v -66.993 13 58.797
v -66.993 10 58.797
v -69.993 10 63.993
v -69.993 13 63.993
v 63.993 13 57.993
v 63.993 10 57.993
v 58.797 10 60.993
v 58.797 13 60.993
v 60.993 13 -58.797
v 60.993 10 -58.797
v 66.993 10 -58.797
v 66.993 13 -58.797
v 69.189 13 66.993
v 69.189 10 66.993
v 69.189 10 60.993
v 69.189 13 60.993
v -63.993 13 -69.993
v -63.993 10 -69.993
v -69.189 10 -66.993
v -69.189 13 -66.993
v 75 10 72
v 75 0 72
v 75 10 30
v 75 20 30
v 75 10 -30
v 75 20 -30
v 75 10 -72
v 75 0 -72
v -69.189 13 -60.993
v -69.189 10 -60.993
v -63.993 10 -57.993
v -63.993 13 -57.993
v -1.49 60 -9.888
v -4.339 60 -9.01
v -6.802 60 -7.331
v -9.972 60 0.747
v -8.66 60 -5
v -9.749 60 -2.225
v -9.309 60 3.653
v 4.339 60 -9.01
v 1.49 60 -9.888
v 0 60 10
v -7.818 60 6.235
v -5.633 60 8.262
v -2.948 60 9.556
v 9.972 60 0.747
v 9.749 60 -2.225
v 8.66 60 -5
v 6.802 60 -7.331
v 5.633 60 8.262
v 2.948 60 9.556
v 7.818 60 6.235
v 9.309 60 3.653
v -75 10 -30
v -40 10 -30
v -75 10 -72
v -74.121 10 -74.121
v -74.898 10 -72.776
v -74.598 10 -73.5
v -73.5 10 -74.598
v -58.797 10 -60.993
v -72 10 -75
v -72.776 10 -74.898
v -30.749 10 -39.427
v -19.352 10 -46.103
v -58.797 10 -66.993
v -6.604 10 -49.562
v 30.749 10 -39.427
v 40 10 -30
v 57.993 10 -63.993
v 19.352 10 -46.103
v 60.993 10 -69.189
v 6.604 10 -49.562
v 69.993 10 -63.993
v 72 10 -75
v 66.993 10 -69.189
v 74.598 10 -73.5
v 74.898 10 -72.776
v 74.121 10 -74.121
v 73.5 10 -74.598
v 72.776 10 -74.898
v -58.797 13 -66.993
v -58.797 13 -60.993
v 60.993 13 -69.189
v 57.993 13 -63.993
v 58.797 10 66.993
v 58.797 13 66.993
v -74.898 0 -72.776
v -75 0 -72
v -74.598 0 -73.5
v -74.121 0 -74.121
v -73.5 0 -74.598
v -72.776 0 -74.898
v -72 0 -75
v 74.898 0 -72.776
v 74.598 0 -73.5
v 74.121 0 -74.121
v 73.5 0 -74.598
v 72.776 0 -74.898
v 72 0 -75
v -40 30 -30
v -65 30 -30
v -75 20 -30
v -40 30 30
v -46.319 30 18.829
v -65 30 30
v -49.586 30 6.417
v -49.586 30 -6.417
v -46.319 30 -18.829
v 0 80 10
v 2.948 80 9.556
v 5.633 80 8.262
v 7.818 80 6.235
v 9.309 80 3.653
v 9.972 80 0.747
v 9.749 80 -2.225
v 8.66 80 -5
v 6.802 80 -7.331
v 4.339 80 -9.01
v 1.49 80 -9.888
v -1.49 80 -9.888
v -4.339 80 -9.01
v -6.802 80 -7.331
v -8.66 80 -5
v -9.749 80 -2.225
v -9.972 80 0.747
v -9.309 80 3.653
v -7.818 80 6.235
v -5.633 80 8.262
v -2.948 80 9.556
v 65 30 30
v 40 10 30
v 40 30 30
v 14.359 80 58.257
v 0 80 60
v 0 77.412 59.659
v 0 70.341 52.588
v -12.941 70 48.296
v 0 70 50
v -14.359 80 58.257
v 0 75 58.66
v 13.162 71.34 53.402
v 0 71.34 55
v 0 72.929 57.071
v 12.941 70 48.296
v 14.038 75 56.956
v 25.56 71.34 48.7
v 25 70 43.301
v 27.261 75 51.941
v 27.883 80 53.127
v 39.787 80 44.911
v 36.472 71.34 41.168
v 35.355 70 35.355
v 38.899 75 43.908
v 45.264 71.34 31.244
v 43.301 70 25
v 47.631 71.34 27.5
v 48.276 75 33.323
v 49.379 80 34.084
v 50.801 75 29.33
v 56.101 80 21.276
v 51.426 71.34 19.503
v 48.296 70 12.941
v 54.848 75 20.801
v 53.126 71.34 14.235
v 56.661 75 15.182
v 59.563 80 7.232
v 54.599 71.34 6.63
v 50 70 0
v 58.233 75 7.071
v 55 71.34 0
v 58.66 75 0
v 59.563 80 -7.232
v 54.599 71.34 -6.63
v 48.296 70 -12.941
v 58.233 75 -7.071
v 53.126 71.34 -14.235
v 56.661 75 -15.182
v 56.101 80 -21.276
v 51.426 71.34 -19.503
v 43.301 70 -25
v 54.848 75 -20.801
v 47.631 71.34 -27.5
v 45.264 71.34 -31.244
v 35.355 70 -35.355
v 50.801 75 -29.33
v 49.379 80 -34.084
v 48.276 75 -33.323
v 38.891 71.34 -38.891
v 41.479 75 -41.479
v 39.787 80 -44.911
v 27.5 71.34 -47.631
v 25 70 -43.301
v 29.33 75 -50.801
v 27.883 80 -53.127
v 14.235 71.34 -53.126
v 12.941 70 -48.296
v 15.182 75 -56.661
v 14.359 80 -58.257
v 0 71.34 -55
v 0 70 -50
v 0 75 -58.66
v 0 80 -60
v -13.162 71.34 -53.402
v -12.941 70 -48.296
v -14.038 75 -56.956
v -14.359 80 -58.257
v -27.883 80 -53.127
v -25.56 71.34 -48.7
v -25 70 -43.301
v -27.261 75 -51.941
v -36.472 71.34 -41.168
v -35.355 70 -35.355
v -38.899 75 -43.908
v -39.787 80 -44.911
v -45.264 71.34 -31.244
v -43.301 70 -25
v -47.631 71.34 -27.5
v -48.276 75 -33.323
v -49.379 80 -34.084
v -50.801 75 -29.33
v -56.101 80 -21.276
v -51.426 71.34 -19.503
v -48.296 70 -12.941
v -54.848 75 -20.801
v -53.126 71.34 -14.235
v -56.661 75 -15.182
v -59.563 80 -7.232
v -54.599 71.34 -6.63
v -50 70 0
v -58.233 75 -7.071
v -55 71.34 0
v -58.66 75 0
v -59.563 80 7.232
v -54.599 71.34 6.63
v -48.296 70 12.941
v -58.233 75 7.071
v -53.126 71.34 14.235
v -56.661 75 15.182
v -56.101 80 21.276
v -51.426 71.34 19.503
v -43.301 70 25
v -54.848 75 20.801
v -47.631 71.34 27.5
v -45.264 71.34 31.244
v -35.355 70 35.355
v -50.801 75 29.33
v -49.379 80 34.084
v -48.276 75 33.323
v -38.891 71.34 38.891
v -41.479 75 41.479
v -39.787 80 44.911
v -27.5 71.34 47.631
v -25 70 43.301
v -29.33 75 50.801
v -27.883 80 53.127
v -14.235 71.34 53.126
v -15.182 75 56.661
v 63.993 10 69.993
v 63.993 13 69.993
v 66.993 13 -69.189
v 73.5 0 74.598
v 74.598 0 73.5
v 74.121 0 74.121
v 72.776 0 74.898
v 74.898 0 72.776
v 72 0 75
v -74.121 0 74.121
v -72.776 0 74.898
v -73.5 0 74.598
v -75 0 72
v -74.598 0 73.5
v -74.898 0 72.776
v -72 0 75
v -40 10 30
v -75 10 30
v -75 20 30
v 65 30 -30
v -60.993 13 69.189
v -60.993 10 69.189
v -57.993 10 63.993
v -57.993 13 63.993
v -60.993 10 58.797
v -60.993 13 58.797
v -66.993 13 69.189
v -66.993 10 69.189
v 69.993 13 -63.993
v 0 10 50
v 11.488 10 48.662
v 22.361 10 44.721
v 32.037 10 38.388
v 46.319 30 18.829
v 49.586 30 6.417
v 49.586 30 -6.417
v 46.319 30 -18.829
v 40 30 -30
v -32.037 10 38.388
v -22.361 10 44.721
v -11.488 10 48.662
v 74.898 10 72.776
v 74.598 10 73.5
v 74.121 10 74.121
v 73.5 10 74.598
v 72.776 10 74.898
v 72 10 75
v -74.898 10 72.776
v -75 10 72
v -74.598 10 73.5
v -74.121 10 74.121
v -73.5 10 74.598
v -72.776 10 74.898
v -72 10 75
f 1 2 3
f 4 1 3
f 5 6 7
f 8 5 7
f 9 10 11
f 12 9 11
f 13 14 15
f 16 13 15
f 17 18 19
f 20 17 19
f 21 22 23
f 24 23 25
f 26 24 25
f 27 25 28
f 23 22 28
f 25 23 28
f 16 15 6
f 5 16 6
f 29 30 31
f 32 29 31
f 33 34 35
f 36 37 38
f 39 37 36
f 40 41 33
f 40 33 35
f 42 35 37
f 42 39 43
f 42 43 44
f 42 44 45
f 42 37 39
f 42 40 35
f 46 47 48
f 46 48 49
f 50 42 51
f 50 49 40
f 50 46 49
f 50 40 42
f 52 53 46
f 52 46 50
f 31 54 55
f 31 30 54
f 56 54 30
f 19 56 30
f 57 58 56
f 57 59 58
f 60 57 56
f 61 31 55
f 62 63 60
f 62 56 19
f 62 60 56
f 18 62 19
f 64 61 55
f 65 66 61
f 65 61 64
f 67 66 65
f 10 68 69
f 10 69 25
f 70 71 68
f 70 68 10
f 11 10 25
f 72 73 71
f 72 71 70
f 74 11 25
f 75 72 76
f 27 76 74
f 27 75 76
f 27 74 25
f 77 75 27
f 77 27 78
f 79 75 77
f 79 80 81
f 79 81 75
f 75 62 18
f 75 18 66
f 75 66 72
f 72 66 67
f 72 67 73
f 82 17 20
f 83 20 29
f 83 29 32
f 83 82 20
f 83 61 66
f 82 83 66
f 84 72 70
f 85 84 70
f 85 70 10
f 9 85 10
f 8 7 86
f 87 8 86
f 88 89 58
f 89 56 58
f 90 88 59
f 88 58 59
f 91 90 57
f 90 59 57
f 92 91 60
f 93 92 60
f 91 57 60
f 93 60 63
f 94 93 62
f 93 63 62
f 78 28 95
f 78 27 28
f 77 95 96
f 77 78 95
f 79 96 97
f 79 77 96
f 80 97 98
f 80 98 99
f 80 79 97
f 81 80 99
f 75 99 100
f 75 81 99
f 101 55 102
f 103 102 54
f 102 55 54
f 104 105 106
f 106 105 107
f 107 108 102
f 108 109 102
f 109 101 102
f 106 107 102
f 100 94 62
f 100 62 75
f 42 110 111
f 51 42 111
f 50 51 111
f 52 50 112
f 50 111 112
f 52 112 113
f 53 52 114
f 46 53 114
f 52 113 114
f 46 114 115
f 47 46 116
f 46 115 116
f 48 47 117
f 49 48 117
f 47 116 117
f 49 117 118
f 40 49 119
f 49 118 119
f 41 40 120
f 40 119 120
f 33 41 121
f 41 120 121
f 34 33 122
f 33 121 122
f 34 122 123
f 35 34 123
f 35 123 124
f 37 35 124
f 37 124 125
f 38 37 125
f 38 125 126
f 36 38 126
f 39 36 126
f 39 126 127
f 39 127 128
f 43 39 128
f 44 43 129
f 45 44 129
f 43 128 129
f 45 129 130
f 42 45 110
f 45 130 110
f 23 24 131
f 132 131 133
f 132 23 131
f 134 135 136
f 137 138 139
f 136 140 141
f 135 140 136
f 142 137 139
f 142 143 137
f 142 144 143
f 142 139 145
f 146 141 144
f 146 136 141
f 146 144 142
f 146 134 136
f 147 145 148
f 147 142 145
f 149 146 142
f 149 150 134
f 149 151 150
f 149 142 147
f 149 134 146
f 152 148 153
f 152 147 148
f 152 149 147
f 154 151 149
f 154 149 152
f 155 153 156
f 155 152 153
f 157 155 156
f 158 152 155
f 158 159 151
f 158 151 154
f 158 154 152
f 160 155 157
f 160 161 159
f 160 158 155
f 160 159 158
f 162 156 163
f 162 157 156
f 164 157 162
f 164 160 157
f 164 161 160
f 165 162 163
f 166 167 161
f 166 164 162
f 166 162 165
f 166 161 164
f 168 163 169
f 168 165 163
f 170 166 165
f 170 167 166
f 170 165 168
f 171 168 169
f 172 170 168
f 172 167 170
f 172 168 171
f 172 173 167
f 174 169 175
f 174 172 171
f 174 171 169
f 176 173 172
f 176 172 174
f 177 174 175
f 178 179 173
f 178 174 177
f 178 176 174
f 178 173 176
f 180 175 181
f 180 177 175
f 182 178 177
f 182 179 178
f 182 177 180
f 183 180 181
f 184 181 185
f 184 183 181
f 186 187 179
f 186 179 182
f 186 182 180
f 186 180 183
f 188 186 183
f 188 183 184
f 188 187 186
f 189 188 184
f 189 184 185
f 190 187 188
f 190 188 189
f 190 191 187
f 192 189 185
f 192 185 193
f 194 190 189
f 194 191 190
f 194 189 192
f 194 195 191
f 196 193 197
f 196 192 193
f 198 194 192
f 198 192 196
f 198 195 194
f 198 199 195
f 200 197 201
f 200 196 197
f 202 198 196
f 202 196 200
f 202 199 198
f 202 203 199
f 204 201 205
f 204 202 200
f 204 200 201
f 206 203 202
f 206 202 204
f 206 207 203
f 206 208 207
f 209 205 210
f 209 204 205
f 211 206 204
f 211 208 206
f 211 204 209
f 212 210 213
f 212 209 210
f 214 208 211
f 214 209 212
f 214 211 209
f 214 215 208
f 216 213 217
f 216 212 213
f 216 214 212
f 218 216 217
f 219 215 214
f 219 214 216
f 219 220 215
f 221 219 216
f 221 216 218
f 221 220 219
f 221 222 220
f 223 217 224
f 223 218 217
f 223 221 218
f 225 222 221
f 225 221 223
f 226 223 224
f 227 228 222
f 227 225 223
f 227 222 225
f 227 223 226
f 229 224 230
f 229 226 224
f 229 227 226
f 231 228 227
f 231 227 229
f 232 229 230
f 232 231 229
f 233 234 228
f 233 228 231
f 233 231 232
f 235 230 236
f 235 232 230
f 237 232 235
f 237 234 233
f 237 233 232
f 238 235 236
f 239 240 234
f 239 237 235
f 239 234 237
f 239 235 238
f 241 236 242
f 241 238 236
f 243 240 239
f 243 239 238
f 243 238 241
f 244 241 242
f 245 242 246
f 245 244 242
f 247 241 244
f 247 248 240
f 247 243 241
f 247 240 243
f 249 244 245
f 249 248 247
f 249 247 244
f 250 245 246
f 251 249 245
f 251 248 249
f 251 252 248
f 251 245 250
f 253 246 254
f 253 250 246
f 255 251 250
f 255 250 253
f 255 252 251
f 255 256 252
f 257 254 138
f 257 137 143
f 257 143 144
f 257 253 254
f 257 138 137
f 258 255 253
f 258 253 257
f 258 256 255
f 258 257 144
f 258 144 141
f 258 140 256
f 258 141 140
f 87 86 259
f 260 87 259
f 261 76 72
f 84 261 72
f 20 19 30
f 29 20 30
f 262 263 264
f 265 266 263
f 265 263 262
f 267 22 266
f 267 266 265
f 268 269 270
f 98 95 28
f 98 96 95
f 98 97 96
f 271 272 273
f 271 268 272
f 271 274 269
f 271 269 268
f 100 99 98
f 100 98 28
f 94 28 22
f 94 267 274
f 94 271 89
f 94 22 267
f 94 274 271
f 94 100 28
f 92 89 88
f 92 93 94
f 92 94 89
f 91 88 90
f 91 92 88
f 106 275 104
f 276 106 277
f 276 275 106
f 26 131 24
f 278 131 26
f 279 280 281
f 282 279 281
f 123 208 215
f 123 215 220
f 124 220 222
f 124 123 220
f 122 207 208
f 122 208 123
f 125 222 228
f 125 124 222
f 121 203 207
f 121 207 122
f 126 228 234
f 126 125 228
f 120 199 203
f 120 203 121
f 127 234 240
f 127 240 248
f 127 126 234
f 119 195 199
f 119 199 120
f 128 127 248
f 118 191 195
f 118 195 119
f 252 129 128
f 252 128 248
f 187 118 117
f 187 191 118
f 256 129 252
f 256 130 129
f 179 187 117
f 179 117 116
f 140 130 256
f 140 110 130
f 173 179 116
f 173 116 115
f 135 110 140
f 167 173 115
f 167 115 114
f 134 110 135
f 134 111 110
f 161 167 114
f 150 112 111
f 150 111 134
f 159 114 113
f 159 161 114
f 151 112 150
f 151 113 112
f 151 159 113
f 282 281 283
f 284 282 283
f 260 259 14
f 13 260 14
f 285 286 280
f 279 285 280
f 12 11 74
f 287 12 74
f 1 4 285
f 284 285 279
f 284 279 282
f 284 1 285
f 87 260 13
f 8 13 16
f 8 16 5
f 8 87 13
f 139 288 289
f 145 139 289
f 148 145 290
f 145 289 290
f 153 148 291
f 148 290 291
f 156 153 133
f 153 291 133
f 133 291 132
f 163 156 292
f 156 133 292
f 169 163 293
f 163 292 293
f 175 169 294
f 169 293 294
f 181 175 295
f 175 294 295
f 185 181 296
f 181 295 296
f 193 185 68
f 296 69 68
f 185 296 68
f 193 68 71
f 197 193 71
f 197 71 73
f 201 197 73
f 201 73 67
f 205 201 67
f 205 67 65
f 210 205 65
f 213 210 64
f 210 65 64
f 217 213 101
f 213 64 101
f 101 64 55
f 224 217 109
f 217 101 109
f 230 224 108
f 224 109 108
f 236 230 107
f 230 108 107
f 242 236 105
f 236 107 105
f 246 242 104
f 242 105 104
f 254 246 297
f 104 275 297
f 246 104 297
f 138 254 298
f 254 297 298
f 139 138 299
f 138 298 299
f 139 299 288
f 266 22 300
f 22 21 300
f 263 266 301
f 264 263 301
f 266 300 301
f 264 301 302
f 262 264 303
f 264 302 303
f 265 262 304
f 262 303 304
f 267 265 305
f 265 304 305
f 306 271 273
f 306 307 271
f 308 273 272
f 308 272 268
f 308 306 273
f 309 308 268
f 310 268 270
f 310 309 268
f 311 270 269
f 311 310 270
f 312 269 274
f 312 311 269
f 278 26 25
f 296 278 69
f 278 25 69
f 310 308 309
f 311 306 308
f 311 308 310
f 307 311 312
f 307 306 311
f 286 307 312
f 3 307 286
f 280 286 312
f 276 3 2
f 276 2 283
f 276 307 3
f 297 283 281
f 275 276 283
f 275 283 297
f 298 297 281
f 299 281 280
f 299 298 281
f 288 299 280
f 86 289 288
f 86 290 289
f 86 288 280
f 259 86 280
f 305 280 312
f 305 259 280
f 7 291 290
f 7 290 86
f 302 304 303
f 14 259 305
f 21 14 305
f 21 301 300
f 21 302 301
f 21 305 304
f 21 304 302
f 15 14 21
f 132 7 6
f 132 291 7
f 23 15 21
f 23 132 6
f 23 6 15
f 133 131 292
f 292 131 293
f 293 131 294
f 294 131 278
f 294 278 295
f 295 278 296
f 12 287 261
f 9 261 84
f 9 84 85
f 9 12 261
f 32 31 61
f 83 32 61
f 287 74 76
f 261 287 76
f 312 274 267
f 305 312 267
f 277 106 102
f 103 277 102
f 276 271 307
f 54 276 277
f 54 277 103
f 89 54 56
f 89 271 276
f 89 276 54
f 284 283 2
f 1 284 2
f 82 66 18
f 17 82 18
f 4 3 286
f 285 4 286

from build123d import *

# Parameters (mm, degrees)
SKETCH1_W           = 150
SKETCH1_H           = 150
BOSS_EXTRUDE1_DEPTH = 10
SKETCH2_R           = 50
BOSS_EXTRUDE2_DEPTH = 60
SKETCH3_R           = 60
BOSS_EXTRUDE3_DEPTH = 10
SKETCH7_W           = 150
SKETCH7_H           = 60
BOSS_EXTRUDE6_DEPTH = 30
SKETCH8_R           = 10
CUT_EXTRUDE2_DEPTH  = 20
FILLET3_R           = 10
FILLET4_R           = 3
CHAMFER1_SIZE       = 10
BOSS_EXTRUDE7_DEPTH = 3
CIRPATTERN1_COUNT   = 4


with BuildPart() as part:
    # Sketch1 → Boss-Extrude1 (new body)
    with BuildSketch(Plane(origin=(0, 0, 0), x_dir=(1, 0, 0), z_dir=(0, 1, 0))):
        Rectangle(SKETCH1_W, SKETCH1_H)
    extrude(amount=BOSS_EXTRUDE1_DEPTH)

    # Sketch2 → Boss-Extrude2 (add)
    with BuildSketch(Plane(origin=(0, 10, 0), x_dir=(1, 0, 0), z_dir=(0, 1, 0))):
        with Locations(Location((0, 0, 0), (0, 0, 270))):
            Circle(SKETCH2_R)
    extrude(amount=BOSS_EXTRUDE2_DEPTH)

    # Sketch3 → Boss-Extrude3 (add)
    with BuildSketch(Plane(origin=(0, 70, 0), x_dir=(1, 0, 0), z_dir=(0, 1, 0))):
        with Locations(Location((0, 0, 0), (0, 0, 270))):
            Circle(SKETCH3_R)
    extrude(amount=BOSS_EXTRUDE3_DEPTH)

    # Sketch7 → Boss-Extrude6 (add)
    with BuildSketch(Plane(origin=(0, 0, 0), x_dir=(-1, 0, 0), z_dir=(0, -1, 0))):
        Rectangle(SKETCH7_W, SKETCH7_H)
    extrude(amount=-BOSS_EXTRUDE6_DEPTH)

    # Sketch8 → Cut-Extrude2 (cut)
    with BuildSketch(Plane(origin=(0, 80, 0), x_dir=(1, 0, 0), z_dir=(0, 1, 0))):
        with Locations(Location((0, 0, 0), (0, 0, 270))):
            Circle(SKETCH8_R)
    extrude(amount=-CUT_EXTRUDE2_DEPTH, mode=Mode.SUBTRACT)

    # Fillet3
    fillet3_edges = [part.edges().sort_by_distance(p)[0] for p in [
        (0, 70, -60),
    ]]
    fillet(fillet3_edges, radius=FILLET3_R - 0.0001)  # a hair under: the kernel refuses the full size

    # Fillet4
    fillet4_edges = [part.edges().sort_by_distance(p)[0] for p in [
        (75, 5, 75),
        (-75, 5, 75),
        (-75, 5, -75),
        (75, 5, -75),
    ]]
    fillet(fillet4_edges, radius=FILLET4_R)

    # Chamfer1
    chamfer1_edges = [part.edges().sort_by_distance(p)[0] for p in [
        (75, 30, 0),
        (-75, 30, 0),
    ]]
    chamfer(chamfer1_edges, length=CHAMFER1_SIZE)

    # Sketch9 → Boss-Extrude7 (add)
    with BuildSketch(Plane(origin=(0, 10, 0), x_dir=(1, 0, 0), z_dir=(0, 1, 0))):
        Polygon((-57.993107668, -63.993107668), (-60.993107668, -58.796955246), (-66.993107668, -58.796955246), (-69.993107668, -63.993107668), (-66.993107668, -69.189260091), (-60.993107668, -69.189260091), align=None)
    boss_extrude7 = extrude(amount=BOSS_EXTRUDE7_DEPTH)

    # CirPattern1: Boss-Extrude7 ×4 about axis
    cirpattern1_axis = Axis((0, 0, 0), (0, 1, 0))
    for i in range(1, CIRPATTERN1_COUNT):
        add(boss_extrude7.rotate(cirpattern1_axis, i * 360 / CIRPATTERN1_COUNT))


solid = part.part
